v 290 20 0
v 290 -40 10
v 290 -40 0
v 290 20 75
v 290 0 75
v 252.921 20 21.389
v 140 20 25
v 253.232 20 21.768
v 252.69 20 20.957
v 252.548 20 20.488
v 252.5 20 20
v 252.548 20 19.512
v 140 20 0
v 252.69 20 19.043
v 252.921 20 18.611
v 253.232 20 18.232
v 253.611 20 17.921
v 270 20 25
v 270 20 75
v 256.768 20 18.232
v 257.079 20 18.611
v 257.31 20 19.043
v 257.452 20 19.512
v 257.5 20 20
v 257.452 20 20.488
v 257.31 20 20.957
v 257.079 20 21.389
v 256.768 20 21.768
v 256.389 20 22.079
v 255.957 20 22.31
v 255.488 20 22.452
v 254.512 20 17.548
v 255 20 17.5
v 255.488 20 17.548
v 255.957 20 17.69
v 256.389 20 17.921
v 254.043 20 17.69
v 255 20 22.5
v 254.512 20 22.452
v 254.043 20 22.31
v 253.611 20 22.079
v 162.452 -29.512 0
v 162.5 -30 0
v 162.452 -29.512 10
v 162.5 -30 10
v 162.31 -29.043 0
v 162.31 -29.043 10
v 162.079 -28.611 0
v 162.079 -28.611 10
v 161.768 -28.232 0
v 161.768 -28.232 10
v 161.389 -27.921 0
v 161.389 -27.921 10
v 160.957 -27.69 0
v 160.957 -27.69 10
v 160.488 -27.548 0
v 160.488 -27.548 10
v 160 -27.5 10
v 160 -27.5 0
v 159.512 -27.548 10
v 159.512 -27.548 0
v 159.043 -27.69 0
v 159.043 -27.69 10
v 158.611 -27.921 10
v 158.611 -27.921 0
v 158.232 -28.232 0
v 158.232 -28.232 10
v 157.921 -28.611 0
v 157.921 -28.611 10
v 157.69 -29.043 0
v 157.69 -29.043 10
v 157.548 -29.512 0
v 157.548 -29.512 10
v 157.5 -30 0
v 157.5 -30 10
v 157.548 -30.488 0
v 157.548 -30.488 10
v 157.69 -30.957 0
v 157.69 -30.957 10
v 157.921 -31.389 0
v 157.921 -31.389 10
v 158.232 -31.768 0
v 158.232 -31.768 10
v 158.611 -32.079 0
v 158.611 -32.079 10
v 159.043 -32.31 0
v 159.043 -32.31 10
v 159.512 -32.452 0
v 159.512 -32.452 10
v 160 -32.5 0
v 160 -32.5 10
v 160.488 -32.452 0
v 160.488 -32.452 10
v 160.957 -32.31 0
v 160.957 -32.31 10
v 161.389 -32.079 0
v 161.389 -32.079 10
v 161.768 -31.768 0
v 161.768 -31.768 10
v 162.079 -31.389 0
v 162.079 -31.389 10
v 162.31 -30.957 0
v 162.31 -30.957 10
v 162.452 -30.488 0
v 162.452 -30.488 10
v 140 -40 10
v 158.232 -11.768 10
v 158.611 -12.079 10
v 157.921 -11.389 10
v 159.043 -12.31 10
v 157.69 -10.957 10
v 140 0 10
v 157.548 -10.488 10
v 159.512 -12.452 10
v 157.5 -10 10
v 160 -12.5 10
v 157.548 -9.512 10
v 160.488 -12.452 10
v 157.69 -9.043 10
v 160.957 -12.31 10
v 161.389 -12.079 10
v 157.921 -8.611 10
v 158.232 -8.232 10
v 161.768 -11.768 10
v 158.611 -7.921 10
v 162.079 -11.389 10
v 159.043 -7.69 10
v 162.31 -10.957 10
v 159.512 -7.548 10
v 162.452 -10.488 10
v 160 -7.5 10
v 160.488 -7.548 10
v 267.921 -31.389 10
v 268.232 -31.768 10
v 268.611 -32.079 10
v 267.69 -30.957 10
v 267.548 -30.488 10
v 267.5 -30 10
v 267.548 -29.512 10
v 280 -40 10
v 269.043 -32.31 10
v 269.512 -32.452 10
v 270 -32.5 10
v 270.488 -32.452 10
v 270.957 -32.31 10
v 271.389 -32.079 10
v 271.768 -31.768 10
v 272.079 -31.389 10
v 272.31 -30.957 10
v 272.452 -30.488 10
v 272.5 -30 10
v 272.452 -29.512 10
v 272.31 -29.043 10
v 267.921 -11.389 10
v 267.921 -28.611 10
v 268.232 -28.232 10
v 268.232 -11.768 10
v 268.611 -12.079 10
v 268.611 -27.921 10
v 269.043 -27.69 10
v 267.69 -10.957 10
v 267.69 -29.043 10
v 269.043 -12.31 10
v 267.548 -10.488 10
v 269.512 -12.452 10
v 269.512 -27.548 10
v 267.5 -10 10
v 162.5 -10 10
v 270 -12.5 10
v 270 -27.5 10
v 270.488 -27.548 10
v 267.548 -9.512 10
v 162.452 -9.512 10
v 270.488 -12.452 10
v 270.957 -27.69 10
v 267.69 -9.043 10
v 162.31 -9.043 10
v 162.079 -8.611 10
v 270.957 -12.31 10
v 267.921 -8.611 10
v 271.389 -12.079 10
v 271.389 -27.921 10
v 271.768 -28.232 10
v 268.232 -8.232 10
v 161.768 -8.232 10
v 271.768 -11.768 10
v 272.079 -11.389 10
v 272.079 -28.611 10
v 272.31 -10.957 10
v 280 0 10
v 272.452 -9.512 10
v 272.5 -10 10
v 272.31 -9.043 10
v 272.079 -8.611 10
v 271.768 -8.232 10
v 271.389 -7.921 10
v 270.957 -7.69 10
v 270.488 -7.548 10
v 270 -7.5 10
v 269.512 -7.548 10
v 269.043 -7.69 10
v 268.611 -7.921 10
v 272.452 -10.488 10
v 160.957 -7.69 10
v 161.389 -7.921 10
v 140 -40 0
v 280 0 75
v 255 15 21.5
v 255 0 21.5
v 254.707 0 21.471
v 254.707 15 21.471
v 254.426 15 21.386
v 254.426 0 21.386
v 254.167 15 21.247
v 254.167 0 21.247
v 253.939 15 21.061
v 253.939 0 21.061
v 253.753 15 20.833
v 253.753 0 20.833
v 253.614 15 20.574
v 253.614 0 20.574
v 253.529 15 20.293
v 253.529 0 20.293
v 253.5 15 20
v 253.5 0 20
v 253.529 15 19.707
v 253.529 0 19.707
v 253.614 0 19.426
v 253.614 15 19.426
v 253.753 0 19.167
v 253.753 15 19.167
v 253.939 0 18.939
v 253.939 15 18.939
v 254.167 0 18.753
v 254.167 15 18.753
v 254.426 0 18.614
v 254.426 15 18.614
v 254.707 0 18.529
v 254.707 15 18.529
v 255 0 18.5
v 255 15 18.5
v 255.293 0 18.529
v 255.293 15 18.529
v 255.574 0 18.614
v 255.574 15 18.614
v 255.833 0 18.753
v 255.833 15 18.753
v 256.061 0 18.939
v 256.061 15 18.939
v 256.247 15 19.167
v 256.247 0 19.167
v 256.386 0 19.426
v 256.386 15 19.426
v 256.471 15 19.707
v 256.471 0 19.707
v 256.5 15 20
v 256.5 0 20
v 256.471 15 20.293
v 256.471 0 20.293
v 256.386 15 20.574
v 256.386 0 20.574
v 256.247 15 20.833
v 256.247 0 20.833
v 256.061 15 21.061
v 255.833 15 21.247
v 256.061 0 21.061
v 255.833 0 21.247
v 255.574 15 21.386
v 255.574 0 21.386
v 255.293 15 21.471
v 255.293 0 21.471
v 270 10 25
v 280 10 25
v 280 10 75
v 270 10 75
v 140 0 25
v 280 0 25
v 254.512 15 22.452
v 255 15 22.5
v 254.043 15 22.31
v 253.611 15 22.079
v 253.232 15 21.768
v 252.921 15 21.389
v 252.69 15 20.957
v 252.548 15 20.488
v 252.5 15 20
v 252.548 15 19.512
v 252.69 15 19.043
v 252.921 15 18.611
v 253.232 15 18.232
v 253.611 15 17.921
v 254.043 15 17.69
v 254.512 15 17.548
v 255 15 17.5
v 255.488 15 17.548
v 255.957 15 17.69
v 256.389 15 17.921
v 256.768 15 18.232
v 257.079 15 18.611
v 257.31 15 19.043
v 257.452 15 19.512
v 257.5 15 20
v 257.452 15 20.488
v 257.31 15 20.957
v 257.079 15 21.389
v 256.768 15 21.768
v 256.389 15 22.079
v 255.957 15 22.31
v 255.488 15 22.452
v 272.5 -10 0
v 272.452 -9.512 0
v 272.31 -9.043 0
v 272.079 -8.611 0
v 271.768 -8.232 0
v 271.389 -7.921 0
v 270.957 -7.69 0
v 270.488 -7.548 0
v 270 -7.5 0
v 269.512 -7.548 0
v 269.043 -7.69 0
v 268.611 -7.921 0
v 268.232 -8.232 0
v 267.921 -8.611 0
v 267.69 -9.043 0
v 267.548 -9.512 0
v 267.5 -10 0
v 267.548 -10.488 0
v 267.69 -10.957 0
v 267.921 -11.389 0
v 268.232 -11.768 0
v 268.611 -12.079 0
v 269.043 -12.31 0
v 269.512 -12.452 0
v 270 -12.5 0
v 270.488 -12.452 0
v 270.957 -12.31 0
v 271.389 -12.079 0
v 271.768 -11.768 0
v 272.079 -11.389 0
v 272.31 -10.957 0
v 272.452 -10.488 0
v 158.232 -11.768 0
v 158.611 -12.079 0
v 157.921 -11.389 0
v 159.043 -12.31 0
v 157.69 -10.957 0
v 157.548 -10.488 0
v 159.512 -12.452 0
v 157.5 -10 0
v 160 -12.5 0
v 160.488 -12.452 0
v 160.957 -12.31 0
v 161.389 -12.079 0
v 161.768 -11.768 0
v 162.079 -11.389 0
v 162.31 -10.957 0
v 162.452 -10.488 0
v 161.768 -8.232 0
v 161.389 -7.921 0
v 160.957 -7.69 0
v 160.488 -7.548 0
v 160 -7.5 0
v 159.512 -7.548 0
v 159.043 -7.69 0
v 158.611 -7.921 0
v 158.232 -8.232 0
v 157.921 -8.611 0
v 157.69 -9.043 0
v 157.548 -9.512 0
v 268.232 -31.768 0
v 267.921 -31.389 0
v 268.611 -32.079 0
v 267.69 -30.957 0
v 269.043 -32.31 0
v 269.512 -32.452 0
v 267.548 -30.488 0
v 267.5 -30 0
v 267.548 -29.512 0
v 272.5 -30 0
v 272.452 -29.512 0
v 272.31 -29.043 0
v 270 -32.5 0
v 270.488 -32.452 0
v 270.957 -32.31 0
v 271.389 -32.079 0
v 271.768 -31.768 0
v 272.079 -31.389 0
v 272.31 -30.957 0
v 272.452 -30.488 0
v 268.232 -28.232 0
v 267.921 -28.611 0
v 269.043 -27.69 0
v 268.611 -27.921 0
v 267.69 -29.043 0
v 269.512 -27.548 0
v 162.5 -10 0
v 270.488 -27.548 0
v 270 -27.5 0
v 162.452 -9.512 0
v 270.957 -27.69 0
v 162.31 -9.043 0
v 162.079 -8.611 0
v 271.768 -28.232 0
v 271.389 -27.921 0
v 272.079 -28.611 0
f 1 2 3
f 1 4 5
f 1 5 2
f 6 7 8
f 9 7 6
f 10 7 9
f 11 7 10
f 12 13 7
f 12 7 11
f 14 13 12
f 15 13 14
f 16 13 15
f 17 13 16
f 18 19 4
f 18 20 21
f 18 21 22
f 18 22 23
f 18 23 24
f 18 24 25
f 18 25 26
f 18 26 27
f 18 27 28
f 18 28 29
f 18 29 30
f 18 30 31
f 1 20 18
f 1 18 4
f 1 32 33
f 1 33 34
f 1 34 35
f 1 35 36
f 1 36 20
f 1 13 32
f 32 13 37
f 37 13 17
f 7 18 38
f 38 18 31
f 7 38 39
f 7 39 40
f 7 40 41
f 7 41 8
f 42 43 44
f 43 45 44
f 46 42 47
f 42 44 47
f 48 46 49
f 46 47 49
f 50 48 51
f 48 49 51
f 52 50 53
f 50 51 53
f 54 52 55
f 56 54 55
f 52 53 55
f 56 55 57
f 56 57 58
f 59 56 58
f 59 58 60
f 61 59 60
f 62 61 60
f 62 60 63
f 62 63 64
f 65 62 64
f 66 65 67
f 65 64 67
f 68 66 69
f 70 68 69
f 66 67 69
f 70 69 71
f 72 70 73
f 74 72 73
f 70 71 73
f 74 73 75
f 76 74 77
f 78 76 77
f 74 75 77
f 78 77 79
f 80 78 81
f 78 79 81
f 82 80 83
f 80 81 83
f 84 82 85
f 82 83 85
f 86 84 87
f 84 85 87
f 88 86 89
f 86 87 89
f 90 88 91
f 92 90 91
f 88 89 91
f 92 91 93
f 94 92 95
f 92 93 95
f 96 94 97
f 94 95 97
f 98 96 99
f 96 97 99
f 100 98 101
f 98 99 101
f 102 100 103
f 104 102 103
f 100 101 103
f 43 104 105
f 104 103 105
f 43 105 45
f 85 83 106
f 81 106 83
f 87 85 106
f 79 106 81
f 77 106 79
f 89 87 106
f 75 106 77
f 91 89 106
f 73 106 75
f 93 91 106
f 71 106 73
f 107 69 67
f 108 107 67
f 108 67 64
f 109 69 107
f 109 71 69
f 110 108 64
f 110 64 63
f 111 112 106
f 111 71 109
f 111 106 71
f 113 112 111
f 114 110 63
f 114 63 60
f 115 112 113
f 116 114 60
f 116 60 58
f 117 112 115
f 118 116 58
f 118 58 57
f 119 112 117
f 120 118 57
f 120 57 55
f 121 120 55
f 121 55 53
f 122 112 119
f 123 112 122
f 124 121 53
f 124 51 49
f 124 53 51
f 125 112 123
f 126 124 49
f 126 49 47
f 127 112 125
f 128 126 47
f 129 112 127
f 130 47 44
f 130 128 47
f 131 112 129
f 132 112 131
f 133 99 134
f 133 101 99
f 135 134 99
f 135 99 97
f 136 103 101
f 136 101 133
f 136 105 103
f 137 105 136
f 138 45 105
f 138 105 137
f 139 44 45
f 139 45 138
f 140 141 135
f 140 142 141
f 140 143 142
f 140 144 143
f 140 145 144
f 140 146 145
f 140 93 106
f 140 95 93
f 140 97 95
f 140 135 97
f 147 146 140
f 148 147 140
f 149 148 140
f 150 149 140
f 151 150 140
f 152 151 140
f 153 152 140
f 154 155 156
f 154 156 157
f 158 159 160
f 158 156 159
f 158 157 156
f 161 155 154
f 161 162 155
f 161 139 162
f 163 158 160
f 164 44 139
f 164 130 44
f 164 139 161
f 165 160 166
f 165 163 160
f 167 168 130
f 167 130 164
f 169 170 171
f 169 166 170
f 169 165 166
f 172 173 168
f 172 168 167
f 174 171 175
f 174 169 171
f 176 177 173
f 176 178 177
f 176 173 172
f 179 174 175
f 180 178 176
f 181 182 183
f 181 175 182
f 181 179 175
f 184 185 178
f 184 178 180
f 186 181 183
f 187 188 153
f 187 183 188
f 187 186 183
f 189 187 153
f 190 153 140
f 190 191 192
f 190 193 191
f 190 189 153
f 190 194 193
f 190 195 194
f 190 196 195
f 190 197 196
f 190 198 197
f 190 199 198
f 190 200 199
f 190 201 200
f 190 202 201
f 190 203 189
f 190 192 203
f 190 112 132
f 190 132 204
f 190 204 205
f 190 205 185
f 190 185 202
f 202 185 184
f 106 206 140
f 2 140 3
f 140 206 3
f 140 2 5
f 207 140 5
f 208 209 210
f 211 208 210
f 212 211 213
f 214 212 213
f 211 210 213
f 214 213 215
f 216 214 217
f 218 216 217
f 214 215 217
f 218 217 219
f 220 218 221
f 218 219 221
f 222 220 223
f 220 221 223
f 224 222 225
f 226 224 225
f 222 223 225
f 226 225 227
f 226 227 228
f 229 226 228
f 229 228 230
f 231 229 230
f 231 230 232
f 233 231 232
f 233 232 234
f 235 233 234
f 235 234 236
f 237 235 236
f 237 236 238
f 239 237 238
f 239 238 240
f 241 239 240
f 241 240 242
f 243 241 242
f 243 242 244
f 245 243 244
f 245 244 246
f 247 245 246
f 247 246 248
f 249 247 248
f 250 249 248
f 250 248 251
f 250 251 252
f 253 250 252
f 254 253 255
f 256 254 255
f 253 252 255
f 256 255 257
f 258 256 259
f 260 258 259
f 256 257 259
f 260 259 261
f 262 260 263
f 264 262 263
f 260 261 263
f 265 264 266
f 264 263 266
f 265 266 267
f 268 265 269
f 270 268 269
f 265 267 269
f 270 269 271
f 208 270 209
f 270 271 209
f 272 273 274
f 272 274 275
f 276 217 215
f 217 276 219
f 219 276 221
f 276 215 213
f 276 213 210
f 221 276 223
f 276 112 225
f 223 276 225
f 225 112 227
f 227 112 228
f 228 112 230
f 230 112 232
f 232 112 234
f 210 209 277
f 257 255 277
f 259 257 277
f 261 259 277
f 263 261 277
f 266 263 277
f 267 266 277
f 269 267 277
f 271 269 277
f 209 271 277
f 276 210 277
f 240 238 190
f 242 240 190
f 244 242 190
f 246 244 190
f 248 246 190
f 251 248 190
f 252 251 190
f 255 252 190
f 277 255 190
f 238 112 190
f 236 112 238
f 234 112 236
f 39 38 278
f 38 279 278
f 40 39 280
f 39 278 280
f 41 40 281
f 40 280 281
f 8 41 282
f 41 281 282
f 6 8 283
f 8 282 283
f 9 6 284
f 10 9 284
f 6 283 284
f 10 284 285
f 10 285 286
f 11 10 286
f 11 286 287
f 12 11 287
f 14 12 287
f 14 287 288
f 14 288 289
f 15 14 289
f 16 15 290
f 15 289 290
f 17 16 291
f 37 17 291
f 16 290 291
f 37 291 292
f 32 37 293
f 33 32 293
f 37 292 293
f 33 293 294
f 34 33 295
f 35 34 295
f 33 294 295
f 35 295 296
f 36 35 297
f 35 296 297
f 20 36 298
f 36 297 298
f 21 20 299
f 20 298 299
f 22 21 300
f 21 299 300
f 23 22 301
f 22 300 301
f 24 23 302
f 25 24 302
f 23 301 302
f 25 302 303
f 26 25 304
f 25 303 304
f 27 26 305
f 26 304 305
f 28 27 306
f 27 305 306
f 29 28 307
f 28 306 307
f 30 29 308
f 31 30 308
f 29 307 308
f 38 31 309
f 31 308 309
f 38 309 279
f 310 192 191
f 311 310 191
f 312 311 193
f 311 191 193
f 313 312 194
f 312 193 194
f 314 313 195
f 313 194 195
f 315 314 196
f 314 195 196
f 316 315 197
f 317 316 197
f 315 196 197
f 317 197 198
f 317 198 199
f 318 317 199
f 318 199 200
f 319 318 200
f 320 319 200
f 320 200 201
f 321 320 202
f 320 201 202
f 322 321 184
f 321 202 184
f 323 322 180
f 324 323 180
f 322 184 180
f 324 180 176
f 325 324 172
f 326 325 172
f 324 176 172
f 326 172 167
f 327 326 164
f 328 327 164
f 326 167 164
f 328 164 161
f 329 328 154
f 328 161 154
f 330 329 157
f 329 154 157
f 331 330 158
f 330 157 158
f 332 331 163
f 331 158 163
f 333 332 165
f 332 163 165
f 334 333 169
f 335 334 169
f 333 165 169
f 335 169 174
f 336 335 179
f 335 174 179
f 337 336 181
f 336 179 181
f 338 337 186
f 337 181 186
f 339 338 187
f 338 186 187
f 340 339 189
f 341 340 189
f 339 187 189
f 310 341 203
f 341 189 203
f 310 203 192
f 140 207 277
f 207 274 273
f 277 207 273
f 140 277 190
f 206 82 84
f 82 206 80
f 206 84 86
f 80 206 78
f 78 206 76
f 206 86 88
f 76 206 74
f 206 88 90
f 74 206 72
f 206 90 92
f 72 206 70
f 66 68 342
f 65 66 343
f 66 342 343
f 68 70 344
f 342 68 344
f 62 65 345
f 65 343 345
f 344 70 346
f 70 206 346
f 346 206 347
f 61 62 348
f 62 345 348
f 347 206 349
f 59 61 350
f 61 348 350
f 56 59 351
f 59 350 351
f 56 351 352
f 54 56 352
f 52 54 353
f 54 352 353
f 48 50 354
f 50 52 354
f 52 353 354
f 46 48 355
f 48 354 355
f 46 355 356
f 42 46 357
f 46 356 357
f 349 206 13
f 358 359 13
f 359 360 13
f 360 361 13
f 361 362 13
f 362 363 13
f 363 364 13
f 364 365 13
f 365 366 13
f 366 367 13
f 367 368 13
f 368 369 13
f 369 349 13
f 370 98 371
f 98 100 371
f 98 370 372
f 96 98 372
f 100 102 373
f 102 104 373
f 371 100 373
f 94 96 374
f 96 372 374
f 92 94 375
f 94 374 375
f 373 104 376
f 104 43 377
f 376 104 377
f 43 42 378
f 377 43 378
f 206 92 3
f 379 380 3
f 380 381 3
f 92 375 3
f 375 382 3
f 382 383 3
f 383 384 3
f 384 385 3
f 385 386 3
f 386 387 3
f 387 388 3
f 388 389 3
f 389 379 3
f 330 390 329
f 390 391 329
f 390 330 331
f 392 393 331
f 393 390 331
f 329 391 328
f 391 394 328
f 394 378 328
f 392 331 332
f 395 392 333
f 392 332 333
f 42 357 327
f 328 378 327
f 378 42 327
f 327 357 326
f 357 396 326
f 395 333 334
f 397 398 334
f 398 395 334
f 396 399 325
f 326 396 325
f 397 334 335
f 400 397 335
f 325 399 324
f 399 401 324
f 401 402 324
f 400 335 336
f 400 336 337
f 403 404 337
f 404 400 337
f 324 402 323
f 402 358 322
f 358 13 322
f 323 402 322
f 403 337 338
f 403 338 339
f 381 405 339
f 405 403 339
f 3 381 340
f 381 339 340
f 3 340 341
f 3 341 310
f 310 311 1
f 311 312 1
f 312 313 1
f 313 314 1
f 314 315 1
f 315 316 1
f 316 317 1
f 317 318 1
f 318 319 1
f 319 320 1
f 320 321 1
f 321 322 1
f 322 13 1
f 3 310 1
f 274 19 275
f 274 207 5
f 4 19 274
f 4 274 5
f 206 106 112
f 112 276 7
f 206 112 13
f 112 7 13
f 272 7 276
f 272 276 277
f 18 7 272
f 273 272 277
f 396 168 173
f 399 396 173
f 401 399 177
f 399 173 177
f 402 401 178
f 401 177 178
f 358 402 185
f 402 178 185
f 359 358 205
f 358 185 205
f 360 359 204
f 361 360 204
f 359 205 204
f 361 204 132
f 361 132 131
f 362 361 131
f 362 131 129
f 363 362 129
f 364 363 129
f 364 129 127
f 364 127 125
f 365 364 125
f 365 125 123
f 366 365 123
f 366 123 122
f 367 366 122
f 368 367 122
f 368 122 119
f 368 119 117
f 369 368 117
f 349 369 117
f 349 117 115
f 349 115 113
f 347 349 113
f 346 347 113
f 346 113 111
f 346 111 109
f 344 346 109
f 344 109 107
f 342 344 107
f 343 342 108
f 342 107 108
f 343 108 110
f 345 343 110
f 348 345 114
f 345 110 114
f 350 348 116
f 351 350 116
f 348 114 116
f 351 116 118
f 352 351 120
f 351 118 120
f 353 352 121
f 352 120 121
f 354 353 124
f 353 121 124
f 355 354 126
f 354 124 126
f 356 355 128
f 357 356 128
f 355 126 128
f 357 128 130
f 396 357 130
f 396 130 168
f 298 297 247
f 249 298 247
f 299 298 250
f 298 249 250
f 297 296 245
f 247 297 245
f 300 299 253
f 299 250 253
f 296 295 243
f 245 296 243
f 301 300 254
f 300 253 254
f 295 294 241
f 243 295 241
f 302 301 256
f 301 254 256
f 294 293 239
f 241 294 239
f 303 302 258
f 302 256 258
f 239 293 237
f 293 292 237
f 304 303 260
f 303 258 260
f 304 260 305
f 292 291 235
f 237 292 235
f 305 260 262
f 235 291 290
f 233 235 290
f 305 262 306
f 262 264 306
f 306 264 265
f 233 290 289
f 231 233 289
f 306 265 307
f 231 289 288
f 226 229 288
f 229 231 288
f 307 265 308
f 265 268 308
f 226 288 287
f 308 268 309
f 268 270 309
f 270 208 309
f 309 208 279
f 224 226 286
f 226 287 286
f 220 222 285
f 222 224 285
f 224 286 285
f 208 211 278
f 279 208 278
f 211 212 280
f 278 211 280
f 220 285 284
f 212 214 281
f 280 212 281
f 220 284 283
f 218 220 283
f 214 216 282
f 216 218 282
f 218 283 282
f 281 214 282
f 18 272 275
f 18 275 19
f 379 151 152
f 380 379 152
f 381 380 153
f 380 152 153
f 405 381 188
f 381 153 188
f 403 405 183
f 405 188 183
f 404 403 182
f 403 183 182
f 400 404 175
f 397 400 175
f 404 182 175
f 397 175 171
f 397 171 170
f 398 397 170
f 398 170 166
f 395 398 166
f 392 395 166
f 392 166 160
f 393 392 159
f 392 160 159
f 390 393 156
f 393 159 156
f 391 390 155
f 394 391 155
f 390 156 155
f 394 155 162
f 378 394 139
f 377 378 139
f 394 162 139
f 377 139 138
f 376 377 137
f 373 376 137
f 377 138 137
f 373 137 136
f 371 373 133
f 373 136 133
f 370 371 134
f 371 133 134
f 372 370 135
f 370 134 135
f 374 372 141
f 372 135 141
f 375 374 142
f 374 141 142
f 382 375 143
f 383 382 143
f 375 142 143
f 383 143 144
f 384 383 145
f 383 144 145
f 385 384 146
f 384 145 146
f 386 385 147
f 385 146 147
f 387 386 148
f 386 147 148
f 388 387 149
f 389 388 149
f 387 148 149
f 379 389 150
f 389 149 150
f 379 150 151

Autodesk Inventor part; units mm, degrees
ref_plane "YZ Plane" through (0, 0, 0) normal (1, 0, 0) x (0, 1, 0)
sketch "스케치1" plane through (0, 0, 0) normal (0, 0, 1) x (1, 0, 0)
  line L0 (0, 10) -> (0, 0)
  line L1 (-10, 10) -> (-10, 20)
  line L2 (-10, 20) -> (290, 20)
  line L3 (290, 20) -> (290, 10)
  line L4 (0, 0) -> (280, 0)
  line L5 (290, 10) -> (290, -40)
  line L6 (-10, 10) -> (-10, -40)
  line L7 (-10, -40) -> (290, -40)
  line L8 (0, 10) -> (10, 10)
  line L9 (10, 10) -> (10, 20)
  line L10 (140, 20) -> (140, 10)
  line L11 (0, 0) -> (-10, 0)
  line L12 (280, 10) -> (280, 0)
  line L13 (280, 10) -> (270, 10)
  line L14 (270, 10) -> (270, 20)
  line L15 (280, 0) -> (290, 0)
  point P0 (140, 0)
  dimension "d2" = 10
  dimension "d5" = 10
  dimension "d6" = 300
  dimension "d9" = 60
  dimension "d12" = 10
  dimension "d13" = 10
extrude "돌출1" add sketch "스케치1" along normal blind 25 contours L8 L9 L2 L14 L13 L12 L4 L0 | L0 L11 L6 L1 L2 L9 L8 | L12 L13 L14 L2 L3 L5 L15
extrude "돌출2" add sketch "스케치1" along normal blind 10 contours L8 L9 L2 L14 L13 L12 L4 L0 | L4 L15 L5 L7 L6 L11
extrude "돌출3" add sketch "스케치1" along normal blind 75 contours L0 L11 L6 L1 L2 L9 L8 | L12 L13 L14 L2 L3 L5 L15
sketch "스케치2" plane through (-10, -40, 0) normal (-1, 0, 0) x (0, 0, 1)
  line L0 (0, 60) -> (0, 0) projected
  line L1 (0, 0) -> (10, 0) projected
  line L2 (10, 40) -> (10, 0) projected
  line L3 (10, 40) -> (75, 40) projected
  line L4 (75, 60) -> (75, 40) projected
  line L5 (0, 60) -> (75, 60) projected
  line L6 (75, 40) -> (10, 0)
  point P0 (0, 40)
extrude "돌출4" add sketch "스케치2" against normal up to surface (10 mm away) contours L2 L3 L6
ref_plane "작업 평면1" through (140, -40, 0) normal (1, 0, 0) x (0, 0, -1)
mirror "미러1" about plane through (140, -40, 0) normal (1, 0, 0) of "돌출4"
sketch "스케치3" plane through (0, 0, 10) normal (0, 0, 1) x (1, 0, 0)
  circle A0 centre (160, -10) radius 2.5
  circle A1 centre (270, -10) radius 2.5
  line L0 (270, 20) -> (10, 20) projected
  line L1 (290, -40) -> (290, 0) projected
  line L2 (-10, -40) -> (-10, 0) projected
  circle A2 centre (160, -30) radius 2.5
  circle A3 centre (270, -30) radius 2.5
  line L3 (140, 20) -> (140, -10)
  point P0 (0, 0)
  dimension "d18" = 30
  dimension "d19" = 5
  dimension "d20" = 20
  dimension "d24" = 5
  dimension "d25" = 20
  dimension "d38" = 20
extrude "돌출5" cut sketch "스케치3" against normal through all
sketch "스케치4" plane through (-10, 20, 0) normal (0, 1, 0) x (1, 0, 0)
  line L0 (280, -25) -> (280, -75) projected
  line L1 (20, -25) -> (20, -75) projected
  line L2 (280, -25) -> (20, -25) projected
  point P0 (10, 0)
  point P1 (35, -20)
  point P2 (265, -20)
  dimension "d26" = 15
  dimension "d27" = 15
  dimension "d28" = 5
hole "구멍1" at (25, 20, 20) at (255, 20, 20) direction (0, -1, 0) diameter 3 end through all counterbore diameter 5 counterbore depth 5
ref_plane "작업 평면2" through (140, -40, 0) normal (1, 0, 0) x (0, 0, -1)
sketch "스케치5" plane through (140, -40, 0) normal (1, 0, 0) x (0, 0, -1)
  line L0 (0, 0) -> (-10, 0) projected
  line L1 (0, 0) -> (0, 60) projected
  line L2 (0, 60) -> (-75, 60) projected
  line L3 (-75, 40) -> (-75, 60) projected
  line L4 (-10, 0) -> (-75, 40) projected
  point P0 (0, 40)
extrude "돌출6" cut sketch "스케치5" against normal through all
properties part number "ModuleConnectorRight"
